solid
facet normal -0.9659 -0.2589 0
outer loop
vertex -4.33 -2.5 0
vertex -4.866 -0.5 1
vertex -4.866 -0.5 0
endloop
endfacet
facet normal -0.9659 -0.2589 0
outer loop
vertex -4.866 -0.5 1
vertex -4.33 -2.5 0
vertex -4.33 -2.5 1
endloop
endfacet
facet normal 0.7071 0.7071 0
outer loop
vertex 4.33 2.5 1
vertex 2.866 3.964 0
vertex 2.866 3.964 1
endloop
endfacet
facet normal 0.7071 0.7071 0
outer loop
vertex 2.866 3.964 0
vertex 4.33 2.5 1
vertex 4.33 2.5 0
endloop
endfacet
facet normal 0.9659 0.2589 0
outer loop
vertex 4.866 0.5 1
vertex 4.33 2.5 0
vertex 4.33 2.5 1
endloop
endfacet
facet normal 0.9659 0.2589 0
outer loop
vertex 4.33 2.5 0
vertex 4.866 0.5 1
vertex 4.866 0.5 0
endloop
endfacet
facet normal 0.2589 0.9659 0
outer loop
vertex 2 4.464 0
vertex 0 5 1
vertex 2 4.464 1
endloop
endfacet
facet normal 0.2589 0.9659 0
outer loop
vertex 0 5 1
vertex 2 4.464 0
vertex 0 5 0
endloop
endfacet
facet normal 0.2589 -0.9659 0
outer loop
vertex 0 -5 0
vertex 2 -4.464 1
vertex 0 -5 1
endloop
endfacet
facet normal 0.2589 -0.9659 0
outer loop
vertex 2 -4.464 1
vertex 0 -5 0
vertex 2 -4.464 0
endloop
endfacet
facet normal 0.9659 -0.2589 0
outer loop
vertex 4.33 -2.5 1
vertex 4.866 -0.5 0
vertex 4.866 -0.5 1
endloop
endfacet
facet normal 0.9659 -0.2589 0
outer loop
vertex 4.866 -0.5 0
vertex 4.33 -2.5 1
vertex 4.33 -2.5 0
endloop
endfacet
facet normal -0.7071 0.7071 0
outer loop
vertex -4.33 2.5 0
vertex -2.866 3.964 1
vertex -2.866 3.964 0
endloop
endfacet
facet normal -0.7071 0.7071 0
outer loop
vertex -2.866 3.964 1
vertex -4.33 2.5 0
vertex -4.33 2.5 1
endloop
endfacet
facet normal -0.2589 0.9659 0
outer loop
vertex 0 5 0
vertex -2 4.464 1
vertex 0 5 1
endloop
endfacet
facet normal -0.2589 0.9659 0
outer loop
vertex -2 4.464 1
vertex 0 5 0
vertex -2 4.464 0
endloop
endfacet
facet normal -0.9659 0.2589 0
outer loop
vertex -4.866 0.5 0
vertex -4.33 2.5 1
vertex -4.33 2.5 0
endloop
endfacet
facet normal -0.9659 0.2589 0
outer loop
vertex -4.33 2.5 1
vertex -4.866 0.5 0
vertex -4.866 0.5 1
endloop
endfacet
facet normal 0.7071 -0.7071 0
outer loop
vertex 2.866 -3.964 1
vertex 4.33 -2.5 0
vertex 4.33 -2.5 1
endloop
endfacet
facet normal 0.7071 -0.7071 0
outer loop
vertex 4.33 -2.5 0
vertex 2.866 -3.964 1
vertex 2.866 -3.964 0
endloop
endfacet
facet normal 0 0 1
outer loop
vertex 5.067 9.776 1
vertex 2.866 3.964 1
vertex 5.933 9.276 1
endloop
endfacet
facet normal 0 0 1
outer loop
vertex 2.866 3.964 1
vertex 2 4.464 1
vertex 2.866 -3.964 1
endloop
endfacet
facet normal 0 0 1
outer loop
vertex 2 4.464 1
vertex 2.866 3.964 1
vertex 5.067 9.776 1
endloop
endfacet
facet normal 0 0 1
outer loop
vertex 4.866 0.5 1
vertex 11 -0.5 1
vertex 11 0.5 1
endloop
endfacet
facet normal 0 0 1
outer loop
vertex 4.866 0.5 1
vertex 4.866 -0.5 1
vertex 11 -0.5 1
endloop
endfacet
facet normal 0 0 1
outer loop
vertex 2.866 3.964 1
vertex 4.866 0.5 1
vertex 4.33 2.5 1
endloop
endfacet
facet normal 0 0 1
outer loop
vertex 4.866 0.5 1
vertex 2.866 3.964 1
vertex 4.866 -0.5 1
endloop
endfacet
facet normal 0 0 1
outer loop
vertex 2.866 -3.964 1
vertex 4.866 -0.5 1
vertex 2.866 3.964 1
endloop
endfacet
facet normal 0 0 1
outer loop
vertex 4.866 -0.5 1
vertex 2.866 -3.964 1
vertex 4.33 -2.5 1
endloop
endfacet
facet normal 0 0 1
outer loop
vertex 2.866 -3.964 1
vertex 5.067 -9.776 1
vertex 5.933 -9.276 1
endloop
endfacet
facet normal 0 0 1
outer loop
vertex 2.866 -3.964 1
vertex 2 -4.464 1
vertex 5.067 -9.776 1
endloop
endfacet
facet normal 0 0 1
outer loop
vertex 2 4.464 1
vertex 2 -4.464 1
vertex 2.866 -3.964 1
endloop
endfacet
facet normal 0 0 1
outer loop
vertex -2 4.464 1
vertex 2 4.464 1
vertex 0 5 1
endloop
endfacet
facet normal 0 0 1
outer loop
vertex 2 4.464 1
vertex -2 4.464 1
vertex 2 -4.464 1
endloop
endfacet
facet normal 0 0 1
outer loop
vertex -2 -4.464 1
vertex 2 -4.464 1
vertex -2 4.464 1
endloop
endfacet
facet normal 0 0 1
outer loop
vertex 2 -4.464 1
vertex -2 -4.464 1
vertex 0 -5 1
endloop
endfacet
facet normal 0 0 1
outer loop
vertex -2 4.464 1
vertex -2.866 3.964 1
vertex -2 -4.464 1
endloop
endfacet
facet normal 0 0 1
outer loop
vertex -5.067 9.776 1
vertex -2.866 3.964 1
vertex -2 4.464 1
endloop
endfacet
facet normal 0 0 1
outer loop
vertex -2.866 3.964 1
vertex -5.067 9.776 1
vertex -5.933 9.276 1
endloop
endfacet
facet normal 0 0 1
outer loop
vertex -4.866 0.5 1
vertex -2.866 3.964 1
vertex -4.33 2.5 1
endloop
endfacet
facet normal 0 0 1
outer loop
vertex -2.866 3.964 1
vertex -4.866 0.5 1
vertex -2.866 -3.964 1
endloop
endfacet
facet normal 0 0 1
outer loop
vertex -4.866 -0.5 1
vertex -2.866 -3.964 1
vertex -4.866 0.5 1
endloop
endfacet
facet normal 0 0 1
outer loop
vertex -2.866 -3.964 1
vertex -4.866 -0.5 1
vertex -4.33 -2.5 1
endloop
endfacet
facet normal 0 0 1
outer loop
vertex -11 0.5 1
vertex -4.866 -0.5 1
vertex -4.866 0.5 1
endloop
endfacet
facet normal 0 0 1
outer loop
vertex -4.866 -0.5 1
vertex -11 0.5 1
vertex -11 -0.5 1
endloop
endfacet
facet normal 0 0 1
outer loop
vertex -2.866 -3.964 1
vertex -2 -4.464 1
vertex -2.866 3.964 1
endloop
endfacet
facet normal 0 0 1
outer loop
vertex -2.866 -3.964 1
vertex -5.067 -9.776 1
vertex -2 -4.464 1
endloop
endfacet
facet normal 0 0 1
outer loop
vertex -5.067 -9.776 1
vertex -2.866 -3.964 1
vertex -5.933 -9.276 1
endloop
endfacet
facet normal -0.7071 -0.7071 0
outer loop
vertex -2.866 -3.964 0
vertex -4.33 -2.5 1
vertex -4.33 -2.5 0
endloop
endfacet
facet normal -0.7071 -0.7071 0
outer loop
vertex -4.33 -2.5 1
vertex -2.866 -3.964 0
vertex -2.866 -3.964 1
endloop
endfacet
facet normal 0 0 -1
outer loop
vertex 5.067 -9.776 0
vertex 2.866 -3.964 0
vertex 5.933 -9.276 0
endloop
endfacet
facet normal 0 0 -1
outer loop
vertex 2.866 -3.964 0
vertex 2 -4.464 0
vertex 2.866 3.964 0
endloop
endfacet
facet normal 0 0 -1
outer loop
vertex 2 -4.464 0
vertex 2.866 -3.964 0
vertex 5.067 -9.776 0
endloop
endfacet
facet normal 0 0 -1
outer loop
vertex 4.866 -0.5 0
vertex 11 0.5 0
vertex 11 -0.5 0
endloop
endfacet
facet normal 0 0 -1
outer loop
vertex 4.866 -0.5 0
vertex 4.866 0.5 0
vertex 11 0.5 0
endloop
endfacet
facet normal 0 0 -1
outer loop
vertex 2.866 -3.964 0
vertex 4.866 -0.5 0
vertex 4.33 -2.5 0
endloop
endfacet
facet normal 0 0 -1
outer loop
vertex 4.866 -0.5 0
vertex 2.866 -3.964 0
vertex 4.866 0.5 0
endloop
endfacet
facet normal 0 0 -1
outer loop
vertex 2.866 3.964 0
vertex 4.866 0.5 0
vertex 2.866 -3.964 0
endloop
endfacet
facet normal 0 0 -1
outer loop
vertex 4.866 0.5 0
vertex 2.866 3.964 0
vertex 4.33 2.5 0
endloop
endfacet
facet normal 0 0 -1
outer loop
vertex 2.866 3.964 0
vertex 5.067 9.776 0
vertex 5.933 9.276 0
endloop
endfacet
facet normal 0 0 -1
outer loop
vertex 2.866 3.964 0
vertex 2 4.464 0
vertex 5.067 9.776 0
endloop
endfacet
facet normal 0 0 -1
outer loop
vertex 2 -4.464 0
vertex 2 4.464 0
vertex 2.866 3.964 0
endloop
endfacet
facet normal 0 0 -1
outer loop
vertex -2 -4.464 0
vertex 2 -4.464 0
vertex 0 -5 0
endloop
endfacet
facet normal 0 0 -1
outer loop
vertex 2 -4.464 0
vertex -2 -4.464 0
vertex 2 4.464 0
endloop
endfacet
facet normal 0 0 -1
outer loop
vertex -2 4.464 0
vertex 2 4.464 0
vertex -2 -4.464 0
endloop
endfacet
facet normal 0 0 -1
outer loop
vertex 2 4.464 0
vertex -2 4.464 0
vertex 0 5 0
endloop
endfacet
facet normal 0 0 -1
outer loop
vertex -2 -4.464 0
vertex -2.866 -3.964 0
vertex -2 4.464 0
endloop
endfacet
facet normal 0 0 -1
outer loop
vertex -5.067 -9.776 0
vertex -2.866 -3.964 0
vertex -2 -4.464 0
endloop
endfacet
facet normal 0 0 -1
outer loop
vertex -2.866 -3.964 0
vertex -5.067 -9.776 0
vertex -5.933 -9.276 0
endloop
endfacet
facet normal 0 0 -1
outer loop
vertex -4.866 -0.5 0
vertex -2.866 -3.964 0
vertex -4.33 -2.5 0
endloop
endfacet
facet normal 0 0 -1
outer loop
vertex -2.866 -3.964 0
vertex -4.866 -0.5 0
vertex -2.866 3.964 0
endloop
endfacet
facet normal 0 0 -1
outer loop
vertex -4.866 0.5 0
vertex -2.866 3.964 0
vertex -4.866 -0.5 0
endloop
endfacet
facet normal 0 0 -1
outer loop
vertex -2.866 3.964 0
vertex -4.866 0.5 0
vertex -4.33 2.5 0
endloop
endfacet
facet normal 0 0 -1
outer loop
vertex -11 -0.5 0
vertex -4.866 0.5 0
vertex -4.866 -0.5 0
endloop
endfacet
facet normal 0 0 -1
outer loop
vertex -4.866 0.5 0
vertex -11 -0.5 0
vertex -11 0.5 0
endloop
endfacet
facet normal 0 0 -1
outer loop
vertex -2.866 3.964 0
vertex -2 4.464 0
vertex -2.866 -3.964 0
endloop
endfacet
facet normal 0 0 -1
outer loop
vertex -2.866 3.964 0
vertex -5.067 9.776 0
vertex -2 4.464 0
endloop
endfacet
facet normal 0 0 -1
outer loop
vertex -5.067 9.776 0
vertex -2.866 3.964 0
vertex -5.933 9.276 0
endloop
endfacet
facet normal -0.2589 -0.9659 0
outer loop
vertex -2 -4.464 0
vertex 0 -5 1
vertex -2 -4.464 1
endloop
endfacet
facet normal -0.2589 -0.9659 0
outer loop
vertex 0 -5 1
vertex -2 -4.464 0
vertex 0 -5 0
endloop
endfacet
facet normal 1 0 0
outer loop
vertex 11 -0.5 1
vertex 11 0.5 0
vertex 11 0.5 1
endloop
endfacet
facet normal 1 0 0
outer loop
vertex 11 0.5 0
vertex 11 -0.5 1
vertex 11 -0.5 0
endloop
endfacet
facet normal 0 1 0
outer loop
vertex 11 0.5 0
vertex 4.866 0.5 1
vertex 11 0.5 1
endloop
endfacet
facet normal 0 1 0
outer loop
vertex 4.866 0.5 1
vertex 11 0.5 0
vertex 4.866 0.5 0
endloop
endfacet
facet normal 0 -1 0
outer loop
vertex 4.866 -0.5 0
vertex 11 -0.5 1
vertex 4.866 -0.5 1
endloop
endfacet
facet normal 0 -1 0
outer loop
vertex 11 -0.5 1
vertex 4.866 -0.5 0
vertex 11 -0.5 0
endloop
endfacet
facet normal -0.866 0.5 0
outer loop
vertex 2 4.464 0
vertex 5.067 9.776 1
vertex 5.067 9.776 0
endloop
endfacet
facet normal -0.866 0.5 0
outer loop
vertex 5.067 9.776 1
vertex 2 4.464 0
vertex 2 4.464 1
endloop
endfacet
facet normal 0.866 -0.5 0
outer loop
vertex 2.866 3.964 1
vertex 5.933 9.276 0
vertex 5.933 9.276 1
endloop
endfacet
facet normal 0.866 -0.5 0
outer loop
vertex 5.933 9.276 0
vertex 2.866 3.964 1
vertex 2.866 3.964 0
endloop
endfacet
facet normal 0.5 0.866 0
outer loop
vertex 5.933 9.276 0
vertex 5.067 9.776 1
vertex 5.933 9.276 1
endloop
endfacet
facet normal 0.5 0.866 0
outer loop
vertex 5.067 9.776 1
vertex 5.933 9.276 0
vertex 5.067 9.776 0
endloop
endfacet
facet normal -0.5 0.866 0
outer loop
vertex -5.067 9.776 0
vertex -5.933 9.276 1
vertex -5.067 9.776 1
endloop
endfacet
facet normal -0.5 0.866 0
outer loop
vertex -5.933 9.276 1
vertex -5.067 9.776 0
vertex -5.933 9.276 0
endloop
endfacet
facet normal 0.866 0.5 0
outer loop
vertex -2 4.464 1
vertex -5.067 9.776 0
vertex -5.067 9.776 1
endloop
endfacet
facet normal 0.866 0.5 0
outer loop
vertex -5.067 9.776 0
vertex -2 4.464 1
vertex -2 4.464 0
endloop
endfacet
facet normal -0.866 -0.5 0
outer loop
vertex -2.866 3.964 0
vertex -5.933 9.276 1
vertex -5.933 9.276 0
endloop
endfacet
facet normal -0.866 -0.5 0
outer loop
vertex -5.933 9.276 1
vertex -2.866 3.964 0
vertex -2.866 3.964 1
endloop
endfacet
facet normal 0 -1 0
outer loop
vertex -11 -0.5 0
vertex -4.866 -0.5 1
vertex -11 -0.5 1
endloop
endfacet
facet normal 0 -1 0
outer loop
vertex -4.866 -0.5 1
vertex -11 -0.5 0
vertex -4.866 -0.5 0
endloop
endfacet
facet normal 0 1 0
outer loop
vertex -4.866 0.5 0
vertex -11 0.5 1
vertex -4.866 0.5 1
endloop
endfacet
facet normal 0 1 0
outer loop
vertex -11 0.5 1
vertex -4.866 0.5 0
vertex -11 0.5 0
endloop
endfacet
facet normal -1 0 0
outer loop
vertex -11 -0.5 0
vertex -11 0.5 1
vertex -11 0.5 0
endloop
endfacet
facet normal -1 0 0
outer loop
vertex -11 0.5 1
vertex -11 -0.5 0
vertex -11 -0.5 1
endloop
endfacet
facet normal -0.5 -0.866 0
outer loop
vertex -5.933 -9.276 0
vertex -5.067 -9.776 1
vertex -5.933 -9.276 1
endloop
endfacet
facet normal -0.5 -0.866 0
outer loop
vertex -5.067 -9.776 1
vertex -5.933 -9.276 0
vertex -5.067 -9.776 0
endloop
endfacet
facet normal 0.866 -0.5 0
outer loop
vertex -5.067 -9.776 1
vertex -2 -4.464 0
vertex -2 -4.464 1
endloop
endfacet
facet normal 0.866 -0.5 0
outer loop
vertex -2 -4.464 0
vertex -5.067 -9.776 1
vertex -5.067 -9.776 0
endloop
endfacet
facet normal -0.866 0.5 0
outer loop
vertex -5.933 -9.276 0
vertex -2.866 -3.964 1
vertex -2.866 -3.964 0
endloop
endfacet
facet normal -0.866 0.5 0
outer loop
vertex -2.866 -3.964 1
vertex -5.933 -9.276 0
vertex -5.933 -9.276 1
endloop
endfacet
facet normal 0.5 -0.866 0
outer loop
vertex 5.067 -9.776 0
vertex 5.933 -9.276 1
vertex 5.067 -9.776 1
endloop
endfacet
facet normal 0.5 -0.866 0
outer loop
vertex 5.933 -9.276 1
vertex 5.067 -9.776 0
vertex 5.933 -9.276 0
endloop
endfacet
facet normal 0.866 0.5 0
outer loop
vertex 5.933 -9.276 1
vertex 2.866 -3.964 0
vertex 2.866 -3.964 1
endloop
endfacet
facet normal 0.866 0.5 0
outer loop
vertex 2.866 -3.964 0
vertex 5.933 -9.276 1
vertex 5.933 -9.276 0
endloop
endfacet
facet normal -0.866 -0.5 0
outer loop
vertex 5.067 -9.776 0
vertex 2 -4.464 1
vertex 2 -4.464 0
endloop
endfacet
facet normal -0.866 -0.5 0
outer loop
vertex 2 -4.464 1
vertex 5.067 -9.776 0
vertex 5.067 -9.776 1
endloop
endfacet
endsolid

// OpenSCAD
group() {
	cylinder($fn = 12, $fa = 12, $fs = 2, h = 1, r1 = 5, r2 = 5, center = false);
	multmatrix([[1, 0, 0, 0], [0, 1, 0, 0], [0, 0, 1, 0], [0, 0, 0, 1]]) {
		multmatrix([[1, 0, 0, 1], [0, 1, 0, -0.5], [0, 0, 1, 0], [0, 0, 0, 1]]) {
			cube(size = [10, 1, 1], center = false);
		}
	}
	multmatrix([[0.5, -0.866025, 0, 0], [0.866025, 0.5, 0, 0], [0, 0, 1, 0], [0, 0, 0, 1]]) {
		multmatrix([[1, 0, 0, 1], [0, 1, 0, -0.5], [0, 0, 1, 0], [0, 0, 0, 1]]) {
			cube(size = [10, 1, 1], center = false);
		}
	}
	multmatrix([[-0.5, -0.866025, 0, 0], [0.866025, -0.5, 0, 0], [0, 0, 1, 0], [0, 0, 0, 1]]) {
		multmatrix([[1, 0, 0, 1], [0, 1, 0, -0.5], [0, 0, 1, 0], [0, 0, 0, 1]]) {
			cube(size = [10, 1, 1], center = false);
		}
	}
	multmatrix([[-1, -1.22465e-16, 0, 0], [1.22465e-16, -1, 0, 0], [0, 0, 1, 0], [0, 0, 0, 1]]) {
		multmatrix([[1, 0, 0, 1], [0, 1, 0, -0.5], [0, 0, 1, 0], [0, 0, 0, 1]]) {
			cube(size = [10, 1, 1], center = false);
		}
	}
	multmatrix([[-0.5, 0.866025, 0, 0], [-0.866025, -0.5, 0, 0], [0, 0, 1, 0], [0, 0, 0, 1]]) {
		multmatrix([[1, 0, 0, 1], [0, 1, 0, -0.5], [0, 0, 1, 0], [0, 0, 0, 1]]) {
			cube(size = [10, 1, 1], center = false);
		}
	}
	multmatrix([[0.5, 0.866025, 0, 0], [-0.866025, 0.5, 0, 0], [0, 0, 1, 0], [0, 0, 0, 1]]) {
		multmatrix([[1, 0, 0, 1], [0, 1, 0, -0.5], [0, 0, 1, 0], [0, 0, 0, 1]]) {
			cube(size = [10, 1, 1], center = false);
		}
	}
}
